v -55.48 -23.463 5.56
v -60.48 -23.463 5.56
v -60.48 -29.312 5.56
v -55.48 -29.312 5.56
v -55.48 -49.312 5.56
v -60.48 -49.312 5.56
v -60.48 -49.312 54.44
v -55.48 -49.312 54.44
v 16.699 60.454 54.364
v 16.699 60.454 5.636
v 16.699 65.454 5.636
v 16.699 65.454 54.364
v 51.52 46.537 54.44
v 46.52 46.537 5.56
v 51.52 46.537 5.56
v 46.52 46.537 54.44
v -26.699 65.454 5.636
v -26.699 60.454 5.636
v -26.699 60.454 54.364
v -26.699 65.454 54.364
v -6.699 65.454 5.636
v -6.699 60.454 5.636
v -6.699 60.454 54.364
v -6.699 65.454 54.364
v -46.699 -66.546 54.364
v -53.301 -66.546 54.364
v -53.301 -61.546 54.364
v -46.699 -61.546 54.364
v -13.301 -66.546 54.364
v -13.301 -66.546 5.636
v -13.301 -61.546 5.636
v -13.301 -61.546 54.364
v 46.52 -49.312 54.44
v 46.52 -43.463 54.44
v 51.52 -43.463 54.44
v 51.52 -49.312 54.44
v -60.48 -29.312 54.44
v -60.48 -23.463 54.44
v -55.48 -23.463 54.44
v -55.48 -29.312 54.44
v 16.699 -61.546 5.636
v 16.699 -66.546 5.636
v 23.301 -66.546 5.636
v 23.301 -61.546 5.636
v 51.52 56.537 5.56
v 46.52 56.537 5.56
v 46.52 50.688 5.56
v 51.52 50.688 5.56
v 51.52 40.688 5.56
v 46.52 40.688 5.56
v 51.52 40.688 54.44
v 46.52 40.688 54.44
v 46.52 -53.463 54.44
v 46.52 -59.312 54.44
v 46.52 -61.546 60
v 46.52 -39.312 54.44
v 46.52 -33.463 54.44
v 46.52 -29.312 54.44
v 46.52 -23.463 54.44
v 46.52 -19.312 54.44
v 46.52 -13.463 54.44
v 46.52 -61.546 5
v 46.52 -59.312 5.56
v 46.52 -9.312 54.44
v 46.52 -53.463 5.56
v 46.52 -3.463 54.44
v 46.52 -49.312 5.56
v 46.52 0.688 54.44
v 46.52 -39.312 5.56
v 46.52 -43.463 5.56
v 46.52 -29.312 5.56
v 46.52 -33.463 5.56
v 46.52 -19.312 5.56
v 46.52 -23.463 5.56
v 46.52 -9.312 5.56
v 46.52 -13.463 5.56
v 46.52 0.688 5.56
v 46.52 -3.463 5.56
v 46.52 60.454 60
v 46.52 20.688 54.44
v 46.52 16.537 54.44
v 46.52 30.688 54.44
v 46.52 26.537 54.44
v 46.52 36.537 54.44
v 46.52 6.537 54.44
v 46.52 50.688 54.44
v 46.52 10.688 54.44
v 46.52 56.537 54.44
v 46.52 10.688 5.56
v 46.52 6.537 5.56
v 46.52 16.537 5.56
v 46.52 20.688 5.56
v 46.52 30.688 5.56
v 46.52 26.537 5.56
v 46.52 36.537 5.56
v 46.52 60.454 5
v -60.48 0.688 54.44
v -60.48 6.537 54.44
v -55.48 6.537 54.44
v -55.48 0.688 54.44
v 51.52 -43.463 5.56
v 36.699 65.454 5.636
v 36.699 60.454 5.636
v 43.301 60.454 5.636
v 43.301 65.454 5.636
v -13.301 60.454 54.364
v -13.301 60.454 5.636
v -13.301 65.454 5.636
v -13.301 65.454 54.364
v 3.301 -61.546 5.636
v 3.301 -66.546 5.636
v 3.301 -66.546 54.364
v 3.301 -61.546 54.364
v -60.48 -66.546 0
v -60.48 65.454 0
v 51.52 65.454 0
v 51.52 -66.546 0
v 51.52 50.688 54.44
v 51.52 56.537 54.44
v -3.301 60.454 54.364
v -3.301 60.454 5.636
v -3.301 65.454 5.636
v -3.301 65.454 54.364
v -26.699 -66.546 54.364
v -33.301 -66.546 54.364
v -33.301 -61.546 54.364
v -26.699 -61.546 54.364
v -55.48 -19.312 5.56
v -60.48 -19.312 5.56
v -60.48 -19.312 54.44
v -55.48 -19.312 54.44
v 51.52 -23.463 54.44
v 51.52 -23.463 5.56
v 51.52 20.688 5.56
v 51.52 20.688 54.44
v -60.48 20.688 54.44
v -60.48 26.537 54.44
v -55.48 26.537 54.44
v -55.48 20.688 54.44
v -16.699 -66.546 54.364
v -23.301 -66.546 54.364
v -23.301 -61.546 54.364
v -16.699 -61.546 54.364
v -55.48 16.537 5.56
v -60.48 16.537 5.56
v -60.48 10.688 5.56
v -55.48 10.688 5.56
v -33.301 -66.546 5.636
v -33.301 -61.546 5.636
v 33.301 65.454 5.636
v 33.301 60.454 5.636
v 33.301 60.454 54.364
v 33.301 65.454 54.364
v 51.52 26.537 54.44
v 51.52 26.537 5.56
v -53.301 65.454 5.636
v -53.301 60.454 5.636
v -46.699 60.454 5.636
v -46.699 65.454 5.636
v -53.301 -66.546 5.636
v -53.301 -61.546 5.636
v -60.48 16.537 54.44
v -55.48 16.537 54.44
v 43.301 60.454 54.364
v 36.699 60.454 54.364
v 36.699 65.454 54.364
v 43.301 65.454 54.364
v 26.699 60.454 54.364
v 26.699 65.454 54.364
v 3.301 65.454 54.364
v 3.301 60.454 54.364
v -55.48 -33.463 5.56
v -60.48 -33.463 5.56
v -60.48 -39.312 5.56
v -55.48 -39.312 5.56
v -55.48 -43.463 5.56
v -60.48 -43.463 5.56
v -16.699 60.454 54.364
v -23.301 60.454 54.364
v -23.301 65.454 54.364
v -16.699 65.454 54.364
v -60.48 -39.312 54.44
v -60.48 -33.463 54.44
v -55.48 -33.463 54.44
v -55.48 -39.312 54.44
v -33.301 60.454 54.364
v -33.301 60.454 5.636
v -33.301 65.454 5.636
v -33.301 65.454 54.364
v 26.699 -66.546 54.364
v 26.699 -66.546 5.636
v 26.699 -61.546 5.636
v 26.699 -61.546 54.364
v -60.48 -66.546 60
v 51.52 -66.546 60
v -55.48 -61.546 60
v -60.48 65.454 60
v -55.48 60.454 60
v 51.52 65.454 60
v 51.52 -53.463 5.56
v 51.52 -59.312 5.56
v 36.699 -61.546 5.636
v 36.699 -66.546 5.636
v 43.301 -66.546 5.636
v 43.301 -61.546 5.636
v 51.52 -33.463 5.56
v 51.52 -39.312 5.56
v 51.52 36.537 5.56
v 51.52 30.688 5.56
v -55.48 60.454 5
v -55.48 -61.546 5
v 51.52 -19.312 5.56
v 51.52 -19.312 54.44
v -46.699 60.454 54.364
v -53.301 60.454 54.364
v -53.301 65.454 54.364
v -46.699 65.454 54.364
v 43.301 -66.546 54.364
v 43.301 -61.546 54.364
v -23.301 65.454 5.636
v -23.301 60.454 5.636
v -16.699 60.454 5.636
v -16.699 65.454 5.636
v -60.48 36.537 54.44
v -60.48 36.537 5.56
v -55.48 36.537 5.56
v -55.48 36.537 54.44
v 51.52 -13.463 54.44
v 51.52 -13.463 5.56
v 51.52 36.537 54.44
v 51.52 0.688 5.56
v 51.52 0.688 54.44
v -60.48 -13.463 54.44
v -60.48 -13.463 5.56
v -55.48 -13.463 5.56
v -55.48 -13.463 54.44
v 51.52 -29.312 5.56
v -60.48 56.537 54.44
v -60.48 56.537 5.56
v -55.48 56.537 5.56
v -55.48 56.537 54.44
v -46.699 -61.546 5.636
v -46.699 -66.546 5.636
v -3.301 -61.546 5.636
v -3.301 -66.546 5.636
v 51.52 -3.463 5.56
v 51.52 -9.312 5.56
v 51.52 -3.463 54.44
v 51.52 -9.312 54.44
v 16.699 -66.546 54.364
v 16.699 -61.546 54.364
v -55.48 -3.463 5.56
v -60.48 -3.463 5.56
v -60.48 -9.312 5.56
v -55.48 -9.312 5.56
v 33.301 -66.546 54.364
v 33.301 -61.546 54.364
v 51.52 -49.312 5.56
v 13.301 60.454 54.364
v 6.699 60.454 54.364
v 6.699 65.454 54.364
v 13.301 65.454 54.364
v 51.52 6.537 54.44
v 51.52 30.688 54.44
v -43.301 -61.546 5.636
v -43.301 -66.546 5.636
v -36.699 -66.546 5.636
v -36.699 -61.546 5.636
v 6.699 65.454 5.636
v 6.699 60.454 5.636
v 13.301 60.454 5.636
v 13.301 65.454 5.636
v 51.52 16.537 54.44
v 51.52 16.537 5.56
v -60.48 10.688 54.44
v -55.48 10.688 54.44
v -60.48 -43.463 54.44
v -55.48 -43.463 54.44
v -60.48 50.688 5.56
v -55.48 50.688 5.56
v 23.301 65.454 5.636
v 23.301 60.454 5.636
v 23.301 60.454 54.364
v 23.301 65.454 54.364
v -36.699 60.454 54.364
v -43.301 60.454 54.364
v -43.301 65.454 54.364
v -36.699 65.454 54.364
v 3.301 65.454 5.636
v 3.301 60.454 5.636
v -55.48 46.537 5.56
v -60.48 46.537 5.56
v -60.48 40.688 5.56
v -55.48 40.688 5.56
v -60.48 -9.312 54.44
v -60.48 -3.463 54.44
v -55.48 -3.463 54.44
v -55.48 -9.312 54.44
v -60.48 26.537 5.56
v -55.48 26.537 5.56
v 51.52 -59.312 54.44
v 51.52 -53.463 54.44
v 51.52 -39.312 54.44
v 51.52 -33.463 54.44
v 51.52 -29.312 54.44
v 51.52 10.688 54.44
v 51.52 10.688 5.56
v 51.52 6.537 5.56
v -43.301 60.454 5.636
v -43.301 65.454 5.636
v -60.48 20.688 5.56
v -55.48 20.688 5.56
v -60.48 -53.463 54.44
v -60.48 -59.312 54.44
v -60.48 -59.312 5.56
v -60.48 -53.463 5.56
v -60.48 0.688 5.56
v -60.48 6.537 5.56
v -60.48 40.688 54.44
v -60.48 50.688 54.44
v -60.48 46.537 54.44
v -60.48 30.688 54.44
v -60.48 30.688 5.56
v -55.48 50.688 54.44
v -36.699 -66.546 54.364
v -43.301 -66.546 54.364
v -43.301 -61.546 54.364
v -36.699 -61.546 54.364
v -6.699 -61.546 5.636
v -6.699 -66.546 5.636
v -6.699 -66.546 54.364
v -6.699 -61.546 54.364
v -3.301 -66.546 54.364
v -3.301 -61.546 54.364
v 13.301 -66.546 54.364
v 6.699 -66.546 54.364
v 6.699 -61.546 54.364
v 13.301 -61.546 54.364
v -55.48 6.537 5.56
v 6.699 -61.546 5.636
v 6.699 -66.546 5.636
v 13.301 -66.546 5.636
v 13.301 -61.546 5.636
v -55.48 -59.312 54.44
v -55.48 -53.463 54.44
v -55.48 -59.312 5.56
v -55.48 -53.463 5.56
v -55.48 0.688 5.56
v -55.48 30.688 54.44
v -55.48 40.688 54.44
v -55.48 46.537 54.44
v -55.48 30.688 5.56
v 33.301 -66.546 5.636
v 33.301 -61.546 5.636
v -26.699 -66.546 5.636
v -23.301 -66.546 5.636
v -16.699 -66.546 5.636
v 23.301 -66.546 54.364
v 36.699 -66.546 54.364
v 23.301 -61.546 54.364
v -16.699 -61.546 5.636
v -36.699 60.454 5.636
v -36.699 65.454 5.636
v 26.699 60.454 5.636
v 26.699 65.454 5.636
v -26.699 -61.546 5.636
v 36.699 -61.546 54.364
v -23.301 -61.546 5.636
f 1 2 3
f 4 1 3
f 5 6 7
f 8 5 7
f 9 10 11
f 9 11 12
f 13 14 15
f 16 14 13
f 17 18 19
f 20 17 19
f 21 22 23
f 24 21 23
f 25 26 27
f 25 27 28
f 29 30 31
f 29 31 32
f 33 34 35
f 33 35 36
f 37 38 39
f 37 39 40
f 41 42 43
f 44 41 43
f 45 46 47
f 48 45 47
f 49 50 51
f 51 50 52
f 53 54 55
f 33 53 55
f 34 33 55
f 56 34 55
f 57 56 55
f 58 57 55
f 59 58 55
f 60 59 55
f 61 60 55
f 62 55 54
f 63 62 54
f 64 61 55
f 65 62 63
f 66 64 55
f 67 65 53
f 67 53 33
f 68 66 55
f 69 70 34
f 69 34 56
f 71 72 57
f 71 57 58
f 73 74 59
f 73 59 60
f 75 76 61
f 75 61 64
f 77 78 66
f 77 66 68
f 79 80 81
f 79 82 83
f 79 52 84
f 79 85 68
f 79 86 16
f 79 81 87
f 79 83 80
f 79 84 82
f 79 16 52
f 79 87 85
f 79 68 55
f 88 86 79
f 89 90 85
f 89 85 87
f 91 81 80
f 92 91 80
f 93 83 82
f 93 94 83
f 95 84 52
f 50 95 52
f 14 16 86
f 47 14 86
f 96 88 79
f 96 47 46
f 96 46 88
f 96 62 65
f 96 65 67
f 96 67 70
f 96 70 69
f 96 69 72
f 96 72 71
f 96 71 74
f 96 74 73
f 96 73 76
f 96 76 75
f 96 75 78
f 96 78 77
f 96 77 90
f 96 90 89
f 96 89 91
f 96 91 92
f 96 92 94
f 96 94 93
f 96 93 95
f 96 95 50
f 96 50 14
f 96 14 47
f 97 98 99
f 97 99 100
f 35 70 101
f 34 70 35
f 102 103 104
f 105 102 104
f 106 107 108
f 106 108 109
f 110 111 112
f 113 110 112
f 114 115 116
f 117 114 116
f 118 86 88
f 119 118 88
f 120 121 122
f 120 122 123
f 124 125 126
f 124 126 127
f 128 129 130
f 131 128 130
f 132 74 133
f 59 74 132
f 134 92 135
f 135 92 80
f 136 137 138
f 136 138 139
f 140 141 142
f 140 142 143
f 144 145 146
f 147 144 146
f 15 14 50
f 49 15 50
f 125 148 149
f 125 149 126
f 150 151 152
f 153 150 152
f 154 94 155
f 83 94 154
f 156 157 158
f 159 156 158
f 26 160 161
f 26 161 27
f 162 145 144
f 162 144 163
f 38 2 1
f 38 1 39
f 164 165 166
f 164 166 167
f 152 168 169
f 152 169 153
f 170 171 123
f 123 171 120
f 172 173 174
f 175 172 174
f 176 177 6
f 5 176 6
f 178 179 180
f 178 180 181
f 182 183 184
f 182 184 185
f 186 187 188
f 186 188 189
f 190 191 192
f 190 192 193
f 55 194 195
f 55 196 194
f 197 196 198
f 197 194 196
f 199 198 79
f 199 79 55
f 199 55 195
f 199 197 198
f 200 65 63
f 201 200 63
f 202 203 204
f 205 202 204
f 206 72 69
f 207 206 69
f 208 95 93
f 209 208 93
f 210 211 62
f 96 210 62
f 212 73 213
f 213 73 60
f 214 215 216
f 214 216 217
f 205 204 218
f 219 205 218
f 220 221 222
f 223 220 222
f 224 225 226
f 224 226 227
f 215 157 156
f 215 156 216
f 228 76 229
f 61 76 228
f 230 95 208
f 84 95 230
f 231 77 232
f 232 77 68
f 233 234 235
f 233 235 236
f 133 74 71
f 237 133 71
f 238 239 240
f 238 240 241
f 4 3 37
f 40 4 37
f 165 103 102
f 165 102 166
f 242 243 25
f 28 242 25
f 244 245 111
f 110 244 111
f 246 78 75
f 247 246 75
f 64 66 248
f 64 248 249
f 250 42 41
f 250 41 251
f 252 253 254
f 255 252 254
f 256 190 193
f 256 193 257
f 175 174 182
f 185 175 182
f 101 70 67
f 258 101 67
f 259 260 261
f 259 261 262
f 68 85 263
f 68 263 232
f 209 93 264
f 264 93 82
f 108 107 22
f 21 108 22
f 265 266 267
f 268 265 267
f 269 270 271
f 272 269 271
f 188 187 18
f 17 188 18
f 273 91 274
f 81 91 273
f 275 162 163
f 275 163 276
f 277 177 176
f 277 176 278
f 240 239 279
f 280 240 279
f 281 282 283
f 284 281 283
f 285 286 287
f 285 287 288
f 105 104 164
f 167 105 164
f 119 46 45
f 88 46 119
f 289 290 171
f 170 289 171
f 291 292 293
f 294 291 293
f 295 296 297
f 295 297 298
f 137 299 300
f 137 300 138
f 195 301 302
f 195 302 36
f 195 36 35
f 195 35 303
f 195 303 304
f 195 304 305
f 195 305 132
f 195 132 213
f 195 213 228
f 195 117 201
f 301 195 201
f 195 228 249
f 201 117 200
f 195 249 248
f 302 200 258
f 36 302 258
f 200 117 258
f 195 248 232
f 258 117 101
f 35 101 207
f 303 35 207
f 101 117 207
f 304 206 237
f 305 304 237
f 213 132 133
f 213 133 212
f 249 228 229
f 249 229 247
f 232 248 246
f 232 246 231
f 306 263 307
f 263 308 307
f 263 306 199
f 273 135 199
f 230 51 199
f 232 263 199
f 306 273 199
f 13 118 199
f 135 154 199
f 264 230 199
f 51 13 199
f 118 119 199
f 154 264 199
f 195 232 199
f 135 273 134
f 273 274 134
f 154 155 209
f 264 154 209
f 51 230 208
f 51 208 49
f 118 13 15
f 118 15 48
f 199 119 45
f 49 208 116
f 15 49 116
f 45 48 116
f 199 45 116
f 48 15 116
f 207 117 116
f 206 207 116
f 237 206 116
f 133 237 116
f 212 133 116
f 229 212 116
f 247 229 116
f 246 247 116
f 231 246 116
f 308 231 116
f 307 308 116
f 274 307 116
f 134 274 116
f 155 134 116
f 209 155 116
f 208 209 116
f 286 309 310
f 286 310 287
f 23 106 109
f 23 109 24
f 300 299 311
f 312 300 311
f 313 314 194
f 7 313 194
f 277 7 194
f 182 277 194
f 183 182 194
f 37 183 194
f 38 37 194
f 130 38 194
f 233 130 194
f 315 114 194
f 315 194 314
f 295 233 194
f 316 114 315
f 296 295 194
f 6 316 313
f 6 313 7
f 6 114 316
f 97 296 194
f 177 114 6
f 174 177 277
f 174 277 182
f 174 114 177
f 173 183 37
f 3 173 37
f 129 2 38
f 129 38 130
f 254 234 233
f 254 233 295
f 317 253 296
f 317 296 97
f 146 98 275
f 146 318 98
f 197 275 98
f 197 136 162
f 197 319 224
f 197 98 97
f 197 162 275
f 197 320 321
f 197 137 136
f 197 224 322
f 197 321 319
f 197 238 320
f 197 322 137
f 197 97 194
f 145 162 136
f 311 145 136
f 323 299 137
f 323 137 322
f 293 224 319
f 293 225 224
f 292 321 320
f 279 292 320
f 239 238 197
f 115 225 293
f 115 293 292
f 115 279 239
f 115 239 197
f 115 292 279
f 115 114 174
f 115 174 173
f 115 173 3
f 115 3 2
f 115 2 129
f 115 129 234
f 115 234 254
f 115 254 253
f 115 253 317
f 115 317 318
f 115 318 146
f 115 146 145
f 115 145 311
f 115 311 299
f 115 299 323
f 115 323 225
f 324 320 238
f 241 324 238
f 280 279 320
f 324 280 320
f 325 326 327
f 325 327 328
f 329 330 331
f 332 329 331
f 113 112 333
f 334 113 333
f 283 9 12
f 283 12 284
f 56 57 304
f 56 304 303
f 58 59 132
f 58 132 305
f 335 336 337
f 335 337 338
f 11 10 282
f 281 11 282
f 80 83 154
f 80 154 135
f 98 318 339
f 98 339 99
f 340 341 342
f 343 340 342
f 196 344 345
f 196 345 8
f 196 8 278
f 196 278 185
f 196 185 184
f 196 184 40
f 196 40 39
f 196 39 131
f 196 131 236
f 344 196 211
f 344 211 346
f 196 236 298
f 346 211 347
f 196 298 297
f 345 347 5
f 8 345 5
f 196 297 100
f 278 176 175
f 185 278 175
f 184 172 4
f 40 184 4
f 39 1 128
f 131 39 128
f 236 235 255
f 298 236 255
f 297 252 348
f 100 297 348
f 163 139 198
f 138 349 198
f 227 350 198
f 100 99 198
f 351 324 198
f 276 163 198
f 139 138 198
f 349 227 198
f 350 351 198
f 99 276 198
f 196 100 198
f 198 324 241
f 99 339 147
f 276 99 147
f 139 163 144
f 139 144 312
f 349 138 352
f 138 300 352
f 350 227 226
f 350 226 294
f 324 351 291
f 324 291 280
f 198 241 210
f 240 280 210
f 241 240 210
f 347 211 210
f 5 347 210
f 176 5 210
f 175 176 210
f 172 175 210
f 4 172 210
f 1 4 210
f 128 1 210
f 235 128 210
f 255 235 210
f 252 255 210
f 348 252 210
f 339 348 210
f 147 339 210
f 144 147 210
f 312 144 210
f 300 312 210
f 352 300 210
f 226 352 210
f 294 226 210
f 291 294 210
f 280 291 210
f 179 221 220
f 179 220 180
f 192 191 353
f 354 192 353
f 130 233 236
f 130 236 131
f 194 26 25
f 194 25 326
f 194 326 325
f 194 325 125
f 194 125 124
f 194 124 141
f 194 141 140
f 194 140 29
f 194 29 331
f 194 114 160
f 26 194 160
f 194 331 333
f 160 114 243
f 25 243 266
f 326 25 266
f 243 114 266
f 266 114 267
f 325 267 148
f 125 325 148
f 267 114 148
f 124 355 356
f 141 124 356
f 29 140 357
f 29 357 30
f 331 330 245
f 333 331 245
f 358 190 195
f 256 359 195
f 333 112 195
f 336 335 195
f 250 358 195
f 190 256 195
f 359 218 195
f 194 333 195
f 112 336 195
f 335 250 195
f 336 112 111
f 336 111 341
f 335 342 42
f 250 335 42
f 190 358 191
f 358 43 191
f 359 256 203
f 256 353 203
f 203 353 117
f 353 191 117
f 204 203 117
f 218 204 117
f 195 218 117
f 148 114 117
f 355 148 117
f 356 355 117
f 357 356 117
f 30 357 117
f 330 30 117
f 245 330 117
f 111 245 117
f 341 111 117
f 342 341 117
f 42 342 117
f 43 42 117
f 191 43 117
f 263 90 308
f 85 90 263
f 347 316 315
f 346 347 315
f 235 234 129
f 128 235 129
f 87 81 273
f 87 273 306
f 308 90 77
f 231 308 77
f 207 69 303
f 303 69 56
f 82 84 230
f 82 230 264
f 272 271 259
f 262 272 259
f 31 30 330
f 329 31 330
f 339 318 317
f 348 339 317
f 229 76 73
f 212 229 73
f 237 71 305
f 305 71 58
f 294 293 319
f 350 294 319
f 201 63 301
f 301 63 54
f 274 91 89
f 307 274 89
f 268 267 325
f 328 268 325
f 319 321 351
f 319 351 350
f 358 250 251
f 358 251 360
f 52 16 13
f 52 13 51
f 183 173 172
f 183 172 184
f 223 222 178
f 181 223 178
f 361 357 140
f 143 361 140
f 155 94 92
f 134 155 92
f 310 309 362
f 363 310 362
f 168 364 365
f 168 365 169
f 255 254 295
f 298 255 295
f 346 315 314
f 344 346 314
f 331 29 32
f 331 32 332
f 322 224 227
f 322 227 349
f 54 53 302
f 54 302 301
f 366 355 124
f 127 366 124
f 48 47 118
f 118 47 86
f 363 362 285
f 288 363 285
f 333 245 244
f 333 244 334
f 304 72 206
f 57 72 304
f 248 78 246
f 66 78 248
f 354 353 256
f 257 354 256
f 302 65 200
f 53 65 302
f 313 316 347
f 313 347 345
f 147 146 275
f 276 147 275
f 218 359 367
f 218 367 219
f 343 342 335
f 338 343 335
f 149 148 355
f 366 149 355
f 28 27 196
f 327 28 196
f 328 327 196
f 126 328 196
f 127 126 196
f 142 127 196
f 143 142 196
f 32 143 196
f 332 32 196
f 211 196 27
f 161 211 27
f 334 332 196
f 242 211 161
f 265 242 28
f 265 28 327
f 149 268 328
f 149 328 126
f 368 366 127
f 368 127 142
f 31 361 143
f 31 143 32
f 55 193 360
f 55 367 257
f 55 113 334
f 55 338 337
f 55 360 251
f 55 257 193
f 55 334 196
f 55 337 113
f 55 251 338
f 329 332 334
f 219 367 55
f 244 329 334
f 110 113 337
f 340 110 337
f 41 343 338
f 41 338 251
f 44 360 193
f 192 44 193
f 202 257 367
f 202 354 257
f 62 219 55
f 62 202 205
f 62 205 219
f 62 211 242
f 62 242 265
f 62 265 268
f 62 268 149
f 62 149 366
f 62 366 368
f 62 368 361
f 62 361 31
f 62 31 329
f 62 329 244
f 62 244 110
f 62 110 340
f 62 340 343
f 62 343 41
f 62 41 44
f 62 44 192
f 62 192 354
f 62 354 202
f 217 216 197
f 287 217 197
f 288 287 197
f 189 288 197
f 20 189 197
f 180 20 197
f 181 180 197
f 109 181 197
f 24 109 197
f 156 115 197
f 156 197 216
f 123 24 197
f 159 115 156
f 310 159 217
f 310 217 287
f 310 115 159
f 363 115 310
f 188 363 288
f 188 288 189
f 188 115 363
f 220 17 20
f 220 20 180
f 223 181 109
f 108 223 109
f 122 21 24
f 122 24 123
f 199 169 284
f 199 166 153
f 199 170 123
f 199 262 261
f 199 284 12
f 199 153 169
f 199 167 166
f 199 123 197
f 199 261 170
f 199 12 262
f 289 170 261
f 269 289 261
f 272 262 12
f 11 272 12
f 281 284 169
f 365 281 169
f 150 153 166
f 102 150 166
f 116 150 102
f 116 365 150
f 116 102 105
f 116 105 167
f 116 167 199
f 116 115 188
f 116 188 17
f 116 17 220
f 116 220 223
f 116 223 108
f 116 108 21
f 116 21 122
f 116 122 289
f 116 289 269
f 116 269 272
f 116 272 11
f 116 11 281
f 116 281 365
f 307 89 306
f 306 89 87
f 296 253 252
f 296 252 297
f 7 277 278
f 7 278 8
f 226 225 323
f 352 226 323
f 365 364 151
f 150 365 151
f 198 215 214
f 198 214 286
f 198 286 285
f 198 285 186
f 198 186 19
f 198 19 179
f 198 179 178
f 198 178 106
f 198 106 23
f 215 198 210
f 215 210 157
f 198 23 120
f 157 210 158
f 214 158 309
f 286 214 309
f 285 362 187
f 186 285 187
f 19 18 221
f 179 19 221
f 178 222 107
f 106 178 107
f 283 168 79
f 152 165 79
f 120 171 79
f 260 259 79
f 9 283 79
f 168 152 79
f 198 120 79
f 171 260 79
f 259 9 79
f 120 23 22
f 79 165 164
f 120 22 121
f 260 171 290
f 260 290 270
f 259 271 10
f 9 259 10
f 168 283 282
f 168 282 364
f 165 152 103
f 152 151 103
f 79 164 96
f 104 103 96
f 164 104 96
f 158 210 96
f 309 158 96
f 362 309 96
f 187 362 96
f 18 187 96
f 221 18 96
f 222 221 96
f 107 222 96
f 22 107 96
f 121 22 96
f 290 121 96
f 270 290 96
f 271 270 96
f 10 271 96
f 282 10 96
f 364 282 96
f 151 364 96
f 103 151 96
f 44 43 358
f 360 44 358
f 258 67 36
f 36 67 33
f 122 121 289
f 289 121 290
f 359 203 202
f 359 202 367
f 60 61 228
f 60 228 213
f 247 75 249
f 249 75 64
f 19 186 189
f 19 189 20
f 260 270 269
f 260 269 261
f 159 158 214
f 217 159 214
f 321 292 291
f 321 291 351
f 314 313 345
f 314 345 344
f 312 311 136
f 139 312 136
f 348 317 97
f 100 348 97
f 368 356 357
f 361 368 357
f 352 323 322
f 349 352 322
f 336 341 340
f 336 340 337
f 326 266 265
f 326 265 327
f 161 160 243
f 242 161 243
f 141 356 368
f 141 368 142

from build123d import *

# Parameters (mm, degrees)
F1_W     = 111.9999963282
F1_H     = 131.9999963282
F2_DEPTH = 5
F3_W     = 111.9999963282
F3_H     = 131.9999963282
F3_W_2   = 101.9999984144
F3_H_2   = 121.9999984144
F4_DEPTH = 55
F5_W     = 3.3013222273
F5_H     = 48.7285429239
F5_W_2   = 6.6026444547
F6_DEPTH = 200
F7_W     = 2.9244981706
F7_H     = 48.8800057769
F7_W_2   = 5.8489963412
F8_DEPTH = 200


with BuildPart() as f2:
    # F1 (on face) → F2 (new body)
    with BuildSketch(Plane.XY):
        with Locations((-4.4797024012, -0.5462057889)):
            Rectangle(F1_W, F1_H)
    extrude(amount=F2_DEPTH)

    # F3 (on face) → F4 (join)
    with BuildSketch(Plane.XY.offset(5)):
        with Locations((-4.4797024012, -0.5462057889)):
            Rectangle(F3_W, F3_H)
        with Locations((-4.4797024012, -0.5462057889)):
            Rectangle(F3_W_2, F3_H_2, mode=Mode.SUBTRACT)
    extrude(amount=F4_DEPTH)

    # F5 (on face) → F6 (cut)
    with BuildSketch(Plane.XZ.offset(66.546203953)):
        with Locations((-1.6506611137, 30)):
            Rectangle(F5_W, F5_H)
        with Locations((1.6506611137, 30)):
            Rectangle(F5_W, F5_H)
        with Locations((10, 30)):
            Rectangle(F5_W_2, F5_H)
        with Locations((20, 30)):
            Rectangle(F5_W_2, F5_H)
        with Locations((30, 30)):
            Rectangle(F5_W_2, F5_H)
        with Locations((40, 30)):
            Rectangle(F5_W_2, F5_H)
        with Locations((-10, 30)):
            Rectangle(F5_W_2, F5_H)
        with Locations((-20, 30)):
            Rectangle(F5_W_2, F5_H)
        with Locations((-30, 30)):
            Rectangle(F5_W_2, F5_H)
        with Locations((-40, 30)):
            Rectangle(F5_W_2, F5_H)
        with Locations((-50, 30)):
            Rectangle(F5_W_2, F5_H)
    extrude(amount=-F6_DEPTH, mode=Mode.SUBTRACT)

    # F7 (on face) → F8 (cut)
    with BuildSketch(Plane(origin=(-60.4797005653, 0, 0), x_dir=(0, -1, 0), z_dir=(-1, 0, 0))):
        with Locations((-55.0748649985, 30)):
            Rectangle(F7_W, F7_H)
        with Locations((-52.1503668278, 30)):
            Rectangle(F7_W, F7_H)
        with Locations((-43.6126159132, 30)):
            Rectangle(F7_W_2, F7_H)
        with Locations((-33.6126159132, 30)):
            Rectangle(F7_W_2, F7_H)
        with Locations((-23.6126159132, 30)):
            Rectangle(F7_W_2, F7_H)
        with Locations((-13.6126159132, 30)):
            Rectangle(F7_W_2, F7_H)
        with Locations((-3.6126159132, 30)):
            Rectangle(F7_W_2, F7_H)
        with Locations((6.3873840868, 30)):
            Rectangle(F7_W_2, F7_H)
        with Locations((16.3873840868, 30)):
            Rectangle(F7_W_2, F7_H)
        with Locations((26.3873840868, 30)):
            Rectangle(F7_W_2, F7_H)
        with Locations((36.3873840868, 30)):
            Rectangle(F7_W_2, F7_H)
        with Locations((46.3873840868, 30)):
            Rectangle(F7_W_2, F7_H)
        with Locations((56.3873840868, 30)):
            Rectangle(F7_W_2, F7_H)
    extrude(amount=-F8_DEPTH, mode=Mode.SUBTRACT)


solid = f2.part
